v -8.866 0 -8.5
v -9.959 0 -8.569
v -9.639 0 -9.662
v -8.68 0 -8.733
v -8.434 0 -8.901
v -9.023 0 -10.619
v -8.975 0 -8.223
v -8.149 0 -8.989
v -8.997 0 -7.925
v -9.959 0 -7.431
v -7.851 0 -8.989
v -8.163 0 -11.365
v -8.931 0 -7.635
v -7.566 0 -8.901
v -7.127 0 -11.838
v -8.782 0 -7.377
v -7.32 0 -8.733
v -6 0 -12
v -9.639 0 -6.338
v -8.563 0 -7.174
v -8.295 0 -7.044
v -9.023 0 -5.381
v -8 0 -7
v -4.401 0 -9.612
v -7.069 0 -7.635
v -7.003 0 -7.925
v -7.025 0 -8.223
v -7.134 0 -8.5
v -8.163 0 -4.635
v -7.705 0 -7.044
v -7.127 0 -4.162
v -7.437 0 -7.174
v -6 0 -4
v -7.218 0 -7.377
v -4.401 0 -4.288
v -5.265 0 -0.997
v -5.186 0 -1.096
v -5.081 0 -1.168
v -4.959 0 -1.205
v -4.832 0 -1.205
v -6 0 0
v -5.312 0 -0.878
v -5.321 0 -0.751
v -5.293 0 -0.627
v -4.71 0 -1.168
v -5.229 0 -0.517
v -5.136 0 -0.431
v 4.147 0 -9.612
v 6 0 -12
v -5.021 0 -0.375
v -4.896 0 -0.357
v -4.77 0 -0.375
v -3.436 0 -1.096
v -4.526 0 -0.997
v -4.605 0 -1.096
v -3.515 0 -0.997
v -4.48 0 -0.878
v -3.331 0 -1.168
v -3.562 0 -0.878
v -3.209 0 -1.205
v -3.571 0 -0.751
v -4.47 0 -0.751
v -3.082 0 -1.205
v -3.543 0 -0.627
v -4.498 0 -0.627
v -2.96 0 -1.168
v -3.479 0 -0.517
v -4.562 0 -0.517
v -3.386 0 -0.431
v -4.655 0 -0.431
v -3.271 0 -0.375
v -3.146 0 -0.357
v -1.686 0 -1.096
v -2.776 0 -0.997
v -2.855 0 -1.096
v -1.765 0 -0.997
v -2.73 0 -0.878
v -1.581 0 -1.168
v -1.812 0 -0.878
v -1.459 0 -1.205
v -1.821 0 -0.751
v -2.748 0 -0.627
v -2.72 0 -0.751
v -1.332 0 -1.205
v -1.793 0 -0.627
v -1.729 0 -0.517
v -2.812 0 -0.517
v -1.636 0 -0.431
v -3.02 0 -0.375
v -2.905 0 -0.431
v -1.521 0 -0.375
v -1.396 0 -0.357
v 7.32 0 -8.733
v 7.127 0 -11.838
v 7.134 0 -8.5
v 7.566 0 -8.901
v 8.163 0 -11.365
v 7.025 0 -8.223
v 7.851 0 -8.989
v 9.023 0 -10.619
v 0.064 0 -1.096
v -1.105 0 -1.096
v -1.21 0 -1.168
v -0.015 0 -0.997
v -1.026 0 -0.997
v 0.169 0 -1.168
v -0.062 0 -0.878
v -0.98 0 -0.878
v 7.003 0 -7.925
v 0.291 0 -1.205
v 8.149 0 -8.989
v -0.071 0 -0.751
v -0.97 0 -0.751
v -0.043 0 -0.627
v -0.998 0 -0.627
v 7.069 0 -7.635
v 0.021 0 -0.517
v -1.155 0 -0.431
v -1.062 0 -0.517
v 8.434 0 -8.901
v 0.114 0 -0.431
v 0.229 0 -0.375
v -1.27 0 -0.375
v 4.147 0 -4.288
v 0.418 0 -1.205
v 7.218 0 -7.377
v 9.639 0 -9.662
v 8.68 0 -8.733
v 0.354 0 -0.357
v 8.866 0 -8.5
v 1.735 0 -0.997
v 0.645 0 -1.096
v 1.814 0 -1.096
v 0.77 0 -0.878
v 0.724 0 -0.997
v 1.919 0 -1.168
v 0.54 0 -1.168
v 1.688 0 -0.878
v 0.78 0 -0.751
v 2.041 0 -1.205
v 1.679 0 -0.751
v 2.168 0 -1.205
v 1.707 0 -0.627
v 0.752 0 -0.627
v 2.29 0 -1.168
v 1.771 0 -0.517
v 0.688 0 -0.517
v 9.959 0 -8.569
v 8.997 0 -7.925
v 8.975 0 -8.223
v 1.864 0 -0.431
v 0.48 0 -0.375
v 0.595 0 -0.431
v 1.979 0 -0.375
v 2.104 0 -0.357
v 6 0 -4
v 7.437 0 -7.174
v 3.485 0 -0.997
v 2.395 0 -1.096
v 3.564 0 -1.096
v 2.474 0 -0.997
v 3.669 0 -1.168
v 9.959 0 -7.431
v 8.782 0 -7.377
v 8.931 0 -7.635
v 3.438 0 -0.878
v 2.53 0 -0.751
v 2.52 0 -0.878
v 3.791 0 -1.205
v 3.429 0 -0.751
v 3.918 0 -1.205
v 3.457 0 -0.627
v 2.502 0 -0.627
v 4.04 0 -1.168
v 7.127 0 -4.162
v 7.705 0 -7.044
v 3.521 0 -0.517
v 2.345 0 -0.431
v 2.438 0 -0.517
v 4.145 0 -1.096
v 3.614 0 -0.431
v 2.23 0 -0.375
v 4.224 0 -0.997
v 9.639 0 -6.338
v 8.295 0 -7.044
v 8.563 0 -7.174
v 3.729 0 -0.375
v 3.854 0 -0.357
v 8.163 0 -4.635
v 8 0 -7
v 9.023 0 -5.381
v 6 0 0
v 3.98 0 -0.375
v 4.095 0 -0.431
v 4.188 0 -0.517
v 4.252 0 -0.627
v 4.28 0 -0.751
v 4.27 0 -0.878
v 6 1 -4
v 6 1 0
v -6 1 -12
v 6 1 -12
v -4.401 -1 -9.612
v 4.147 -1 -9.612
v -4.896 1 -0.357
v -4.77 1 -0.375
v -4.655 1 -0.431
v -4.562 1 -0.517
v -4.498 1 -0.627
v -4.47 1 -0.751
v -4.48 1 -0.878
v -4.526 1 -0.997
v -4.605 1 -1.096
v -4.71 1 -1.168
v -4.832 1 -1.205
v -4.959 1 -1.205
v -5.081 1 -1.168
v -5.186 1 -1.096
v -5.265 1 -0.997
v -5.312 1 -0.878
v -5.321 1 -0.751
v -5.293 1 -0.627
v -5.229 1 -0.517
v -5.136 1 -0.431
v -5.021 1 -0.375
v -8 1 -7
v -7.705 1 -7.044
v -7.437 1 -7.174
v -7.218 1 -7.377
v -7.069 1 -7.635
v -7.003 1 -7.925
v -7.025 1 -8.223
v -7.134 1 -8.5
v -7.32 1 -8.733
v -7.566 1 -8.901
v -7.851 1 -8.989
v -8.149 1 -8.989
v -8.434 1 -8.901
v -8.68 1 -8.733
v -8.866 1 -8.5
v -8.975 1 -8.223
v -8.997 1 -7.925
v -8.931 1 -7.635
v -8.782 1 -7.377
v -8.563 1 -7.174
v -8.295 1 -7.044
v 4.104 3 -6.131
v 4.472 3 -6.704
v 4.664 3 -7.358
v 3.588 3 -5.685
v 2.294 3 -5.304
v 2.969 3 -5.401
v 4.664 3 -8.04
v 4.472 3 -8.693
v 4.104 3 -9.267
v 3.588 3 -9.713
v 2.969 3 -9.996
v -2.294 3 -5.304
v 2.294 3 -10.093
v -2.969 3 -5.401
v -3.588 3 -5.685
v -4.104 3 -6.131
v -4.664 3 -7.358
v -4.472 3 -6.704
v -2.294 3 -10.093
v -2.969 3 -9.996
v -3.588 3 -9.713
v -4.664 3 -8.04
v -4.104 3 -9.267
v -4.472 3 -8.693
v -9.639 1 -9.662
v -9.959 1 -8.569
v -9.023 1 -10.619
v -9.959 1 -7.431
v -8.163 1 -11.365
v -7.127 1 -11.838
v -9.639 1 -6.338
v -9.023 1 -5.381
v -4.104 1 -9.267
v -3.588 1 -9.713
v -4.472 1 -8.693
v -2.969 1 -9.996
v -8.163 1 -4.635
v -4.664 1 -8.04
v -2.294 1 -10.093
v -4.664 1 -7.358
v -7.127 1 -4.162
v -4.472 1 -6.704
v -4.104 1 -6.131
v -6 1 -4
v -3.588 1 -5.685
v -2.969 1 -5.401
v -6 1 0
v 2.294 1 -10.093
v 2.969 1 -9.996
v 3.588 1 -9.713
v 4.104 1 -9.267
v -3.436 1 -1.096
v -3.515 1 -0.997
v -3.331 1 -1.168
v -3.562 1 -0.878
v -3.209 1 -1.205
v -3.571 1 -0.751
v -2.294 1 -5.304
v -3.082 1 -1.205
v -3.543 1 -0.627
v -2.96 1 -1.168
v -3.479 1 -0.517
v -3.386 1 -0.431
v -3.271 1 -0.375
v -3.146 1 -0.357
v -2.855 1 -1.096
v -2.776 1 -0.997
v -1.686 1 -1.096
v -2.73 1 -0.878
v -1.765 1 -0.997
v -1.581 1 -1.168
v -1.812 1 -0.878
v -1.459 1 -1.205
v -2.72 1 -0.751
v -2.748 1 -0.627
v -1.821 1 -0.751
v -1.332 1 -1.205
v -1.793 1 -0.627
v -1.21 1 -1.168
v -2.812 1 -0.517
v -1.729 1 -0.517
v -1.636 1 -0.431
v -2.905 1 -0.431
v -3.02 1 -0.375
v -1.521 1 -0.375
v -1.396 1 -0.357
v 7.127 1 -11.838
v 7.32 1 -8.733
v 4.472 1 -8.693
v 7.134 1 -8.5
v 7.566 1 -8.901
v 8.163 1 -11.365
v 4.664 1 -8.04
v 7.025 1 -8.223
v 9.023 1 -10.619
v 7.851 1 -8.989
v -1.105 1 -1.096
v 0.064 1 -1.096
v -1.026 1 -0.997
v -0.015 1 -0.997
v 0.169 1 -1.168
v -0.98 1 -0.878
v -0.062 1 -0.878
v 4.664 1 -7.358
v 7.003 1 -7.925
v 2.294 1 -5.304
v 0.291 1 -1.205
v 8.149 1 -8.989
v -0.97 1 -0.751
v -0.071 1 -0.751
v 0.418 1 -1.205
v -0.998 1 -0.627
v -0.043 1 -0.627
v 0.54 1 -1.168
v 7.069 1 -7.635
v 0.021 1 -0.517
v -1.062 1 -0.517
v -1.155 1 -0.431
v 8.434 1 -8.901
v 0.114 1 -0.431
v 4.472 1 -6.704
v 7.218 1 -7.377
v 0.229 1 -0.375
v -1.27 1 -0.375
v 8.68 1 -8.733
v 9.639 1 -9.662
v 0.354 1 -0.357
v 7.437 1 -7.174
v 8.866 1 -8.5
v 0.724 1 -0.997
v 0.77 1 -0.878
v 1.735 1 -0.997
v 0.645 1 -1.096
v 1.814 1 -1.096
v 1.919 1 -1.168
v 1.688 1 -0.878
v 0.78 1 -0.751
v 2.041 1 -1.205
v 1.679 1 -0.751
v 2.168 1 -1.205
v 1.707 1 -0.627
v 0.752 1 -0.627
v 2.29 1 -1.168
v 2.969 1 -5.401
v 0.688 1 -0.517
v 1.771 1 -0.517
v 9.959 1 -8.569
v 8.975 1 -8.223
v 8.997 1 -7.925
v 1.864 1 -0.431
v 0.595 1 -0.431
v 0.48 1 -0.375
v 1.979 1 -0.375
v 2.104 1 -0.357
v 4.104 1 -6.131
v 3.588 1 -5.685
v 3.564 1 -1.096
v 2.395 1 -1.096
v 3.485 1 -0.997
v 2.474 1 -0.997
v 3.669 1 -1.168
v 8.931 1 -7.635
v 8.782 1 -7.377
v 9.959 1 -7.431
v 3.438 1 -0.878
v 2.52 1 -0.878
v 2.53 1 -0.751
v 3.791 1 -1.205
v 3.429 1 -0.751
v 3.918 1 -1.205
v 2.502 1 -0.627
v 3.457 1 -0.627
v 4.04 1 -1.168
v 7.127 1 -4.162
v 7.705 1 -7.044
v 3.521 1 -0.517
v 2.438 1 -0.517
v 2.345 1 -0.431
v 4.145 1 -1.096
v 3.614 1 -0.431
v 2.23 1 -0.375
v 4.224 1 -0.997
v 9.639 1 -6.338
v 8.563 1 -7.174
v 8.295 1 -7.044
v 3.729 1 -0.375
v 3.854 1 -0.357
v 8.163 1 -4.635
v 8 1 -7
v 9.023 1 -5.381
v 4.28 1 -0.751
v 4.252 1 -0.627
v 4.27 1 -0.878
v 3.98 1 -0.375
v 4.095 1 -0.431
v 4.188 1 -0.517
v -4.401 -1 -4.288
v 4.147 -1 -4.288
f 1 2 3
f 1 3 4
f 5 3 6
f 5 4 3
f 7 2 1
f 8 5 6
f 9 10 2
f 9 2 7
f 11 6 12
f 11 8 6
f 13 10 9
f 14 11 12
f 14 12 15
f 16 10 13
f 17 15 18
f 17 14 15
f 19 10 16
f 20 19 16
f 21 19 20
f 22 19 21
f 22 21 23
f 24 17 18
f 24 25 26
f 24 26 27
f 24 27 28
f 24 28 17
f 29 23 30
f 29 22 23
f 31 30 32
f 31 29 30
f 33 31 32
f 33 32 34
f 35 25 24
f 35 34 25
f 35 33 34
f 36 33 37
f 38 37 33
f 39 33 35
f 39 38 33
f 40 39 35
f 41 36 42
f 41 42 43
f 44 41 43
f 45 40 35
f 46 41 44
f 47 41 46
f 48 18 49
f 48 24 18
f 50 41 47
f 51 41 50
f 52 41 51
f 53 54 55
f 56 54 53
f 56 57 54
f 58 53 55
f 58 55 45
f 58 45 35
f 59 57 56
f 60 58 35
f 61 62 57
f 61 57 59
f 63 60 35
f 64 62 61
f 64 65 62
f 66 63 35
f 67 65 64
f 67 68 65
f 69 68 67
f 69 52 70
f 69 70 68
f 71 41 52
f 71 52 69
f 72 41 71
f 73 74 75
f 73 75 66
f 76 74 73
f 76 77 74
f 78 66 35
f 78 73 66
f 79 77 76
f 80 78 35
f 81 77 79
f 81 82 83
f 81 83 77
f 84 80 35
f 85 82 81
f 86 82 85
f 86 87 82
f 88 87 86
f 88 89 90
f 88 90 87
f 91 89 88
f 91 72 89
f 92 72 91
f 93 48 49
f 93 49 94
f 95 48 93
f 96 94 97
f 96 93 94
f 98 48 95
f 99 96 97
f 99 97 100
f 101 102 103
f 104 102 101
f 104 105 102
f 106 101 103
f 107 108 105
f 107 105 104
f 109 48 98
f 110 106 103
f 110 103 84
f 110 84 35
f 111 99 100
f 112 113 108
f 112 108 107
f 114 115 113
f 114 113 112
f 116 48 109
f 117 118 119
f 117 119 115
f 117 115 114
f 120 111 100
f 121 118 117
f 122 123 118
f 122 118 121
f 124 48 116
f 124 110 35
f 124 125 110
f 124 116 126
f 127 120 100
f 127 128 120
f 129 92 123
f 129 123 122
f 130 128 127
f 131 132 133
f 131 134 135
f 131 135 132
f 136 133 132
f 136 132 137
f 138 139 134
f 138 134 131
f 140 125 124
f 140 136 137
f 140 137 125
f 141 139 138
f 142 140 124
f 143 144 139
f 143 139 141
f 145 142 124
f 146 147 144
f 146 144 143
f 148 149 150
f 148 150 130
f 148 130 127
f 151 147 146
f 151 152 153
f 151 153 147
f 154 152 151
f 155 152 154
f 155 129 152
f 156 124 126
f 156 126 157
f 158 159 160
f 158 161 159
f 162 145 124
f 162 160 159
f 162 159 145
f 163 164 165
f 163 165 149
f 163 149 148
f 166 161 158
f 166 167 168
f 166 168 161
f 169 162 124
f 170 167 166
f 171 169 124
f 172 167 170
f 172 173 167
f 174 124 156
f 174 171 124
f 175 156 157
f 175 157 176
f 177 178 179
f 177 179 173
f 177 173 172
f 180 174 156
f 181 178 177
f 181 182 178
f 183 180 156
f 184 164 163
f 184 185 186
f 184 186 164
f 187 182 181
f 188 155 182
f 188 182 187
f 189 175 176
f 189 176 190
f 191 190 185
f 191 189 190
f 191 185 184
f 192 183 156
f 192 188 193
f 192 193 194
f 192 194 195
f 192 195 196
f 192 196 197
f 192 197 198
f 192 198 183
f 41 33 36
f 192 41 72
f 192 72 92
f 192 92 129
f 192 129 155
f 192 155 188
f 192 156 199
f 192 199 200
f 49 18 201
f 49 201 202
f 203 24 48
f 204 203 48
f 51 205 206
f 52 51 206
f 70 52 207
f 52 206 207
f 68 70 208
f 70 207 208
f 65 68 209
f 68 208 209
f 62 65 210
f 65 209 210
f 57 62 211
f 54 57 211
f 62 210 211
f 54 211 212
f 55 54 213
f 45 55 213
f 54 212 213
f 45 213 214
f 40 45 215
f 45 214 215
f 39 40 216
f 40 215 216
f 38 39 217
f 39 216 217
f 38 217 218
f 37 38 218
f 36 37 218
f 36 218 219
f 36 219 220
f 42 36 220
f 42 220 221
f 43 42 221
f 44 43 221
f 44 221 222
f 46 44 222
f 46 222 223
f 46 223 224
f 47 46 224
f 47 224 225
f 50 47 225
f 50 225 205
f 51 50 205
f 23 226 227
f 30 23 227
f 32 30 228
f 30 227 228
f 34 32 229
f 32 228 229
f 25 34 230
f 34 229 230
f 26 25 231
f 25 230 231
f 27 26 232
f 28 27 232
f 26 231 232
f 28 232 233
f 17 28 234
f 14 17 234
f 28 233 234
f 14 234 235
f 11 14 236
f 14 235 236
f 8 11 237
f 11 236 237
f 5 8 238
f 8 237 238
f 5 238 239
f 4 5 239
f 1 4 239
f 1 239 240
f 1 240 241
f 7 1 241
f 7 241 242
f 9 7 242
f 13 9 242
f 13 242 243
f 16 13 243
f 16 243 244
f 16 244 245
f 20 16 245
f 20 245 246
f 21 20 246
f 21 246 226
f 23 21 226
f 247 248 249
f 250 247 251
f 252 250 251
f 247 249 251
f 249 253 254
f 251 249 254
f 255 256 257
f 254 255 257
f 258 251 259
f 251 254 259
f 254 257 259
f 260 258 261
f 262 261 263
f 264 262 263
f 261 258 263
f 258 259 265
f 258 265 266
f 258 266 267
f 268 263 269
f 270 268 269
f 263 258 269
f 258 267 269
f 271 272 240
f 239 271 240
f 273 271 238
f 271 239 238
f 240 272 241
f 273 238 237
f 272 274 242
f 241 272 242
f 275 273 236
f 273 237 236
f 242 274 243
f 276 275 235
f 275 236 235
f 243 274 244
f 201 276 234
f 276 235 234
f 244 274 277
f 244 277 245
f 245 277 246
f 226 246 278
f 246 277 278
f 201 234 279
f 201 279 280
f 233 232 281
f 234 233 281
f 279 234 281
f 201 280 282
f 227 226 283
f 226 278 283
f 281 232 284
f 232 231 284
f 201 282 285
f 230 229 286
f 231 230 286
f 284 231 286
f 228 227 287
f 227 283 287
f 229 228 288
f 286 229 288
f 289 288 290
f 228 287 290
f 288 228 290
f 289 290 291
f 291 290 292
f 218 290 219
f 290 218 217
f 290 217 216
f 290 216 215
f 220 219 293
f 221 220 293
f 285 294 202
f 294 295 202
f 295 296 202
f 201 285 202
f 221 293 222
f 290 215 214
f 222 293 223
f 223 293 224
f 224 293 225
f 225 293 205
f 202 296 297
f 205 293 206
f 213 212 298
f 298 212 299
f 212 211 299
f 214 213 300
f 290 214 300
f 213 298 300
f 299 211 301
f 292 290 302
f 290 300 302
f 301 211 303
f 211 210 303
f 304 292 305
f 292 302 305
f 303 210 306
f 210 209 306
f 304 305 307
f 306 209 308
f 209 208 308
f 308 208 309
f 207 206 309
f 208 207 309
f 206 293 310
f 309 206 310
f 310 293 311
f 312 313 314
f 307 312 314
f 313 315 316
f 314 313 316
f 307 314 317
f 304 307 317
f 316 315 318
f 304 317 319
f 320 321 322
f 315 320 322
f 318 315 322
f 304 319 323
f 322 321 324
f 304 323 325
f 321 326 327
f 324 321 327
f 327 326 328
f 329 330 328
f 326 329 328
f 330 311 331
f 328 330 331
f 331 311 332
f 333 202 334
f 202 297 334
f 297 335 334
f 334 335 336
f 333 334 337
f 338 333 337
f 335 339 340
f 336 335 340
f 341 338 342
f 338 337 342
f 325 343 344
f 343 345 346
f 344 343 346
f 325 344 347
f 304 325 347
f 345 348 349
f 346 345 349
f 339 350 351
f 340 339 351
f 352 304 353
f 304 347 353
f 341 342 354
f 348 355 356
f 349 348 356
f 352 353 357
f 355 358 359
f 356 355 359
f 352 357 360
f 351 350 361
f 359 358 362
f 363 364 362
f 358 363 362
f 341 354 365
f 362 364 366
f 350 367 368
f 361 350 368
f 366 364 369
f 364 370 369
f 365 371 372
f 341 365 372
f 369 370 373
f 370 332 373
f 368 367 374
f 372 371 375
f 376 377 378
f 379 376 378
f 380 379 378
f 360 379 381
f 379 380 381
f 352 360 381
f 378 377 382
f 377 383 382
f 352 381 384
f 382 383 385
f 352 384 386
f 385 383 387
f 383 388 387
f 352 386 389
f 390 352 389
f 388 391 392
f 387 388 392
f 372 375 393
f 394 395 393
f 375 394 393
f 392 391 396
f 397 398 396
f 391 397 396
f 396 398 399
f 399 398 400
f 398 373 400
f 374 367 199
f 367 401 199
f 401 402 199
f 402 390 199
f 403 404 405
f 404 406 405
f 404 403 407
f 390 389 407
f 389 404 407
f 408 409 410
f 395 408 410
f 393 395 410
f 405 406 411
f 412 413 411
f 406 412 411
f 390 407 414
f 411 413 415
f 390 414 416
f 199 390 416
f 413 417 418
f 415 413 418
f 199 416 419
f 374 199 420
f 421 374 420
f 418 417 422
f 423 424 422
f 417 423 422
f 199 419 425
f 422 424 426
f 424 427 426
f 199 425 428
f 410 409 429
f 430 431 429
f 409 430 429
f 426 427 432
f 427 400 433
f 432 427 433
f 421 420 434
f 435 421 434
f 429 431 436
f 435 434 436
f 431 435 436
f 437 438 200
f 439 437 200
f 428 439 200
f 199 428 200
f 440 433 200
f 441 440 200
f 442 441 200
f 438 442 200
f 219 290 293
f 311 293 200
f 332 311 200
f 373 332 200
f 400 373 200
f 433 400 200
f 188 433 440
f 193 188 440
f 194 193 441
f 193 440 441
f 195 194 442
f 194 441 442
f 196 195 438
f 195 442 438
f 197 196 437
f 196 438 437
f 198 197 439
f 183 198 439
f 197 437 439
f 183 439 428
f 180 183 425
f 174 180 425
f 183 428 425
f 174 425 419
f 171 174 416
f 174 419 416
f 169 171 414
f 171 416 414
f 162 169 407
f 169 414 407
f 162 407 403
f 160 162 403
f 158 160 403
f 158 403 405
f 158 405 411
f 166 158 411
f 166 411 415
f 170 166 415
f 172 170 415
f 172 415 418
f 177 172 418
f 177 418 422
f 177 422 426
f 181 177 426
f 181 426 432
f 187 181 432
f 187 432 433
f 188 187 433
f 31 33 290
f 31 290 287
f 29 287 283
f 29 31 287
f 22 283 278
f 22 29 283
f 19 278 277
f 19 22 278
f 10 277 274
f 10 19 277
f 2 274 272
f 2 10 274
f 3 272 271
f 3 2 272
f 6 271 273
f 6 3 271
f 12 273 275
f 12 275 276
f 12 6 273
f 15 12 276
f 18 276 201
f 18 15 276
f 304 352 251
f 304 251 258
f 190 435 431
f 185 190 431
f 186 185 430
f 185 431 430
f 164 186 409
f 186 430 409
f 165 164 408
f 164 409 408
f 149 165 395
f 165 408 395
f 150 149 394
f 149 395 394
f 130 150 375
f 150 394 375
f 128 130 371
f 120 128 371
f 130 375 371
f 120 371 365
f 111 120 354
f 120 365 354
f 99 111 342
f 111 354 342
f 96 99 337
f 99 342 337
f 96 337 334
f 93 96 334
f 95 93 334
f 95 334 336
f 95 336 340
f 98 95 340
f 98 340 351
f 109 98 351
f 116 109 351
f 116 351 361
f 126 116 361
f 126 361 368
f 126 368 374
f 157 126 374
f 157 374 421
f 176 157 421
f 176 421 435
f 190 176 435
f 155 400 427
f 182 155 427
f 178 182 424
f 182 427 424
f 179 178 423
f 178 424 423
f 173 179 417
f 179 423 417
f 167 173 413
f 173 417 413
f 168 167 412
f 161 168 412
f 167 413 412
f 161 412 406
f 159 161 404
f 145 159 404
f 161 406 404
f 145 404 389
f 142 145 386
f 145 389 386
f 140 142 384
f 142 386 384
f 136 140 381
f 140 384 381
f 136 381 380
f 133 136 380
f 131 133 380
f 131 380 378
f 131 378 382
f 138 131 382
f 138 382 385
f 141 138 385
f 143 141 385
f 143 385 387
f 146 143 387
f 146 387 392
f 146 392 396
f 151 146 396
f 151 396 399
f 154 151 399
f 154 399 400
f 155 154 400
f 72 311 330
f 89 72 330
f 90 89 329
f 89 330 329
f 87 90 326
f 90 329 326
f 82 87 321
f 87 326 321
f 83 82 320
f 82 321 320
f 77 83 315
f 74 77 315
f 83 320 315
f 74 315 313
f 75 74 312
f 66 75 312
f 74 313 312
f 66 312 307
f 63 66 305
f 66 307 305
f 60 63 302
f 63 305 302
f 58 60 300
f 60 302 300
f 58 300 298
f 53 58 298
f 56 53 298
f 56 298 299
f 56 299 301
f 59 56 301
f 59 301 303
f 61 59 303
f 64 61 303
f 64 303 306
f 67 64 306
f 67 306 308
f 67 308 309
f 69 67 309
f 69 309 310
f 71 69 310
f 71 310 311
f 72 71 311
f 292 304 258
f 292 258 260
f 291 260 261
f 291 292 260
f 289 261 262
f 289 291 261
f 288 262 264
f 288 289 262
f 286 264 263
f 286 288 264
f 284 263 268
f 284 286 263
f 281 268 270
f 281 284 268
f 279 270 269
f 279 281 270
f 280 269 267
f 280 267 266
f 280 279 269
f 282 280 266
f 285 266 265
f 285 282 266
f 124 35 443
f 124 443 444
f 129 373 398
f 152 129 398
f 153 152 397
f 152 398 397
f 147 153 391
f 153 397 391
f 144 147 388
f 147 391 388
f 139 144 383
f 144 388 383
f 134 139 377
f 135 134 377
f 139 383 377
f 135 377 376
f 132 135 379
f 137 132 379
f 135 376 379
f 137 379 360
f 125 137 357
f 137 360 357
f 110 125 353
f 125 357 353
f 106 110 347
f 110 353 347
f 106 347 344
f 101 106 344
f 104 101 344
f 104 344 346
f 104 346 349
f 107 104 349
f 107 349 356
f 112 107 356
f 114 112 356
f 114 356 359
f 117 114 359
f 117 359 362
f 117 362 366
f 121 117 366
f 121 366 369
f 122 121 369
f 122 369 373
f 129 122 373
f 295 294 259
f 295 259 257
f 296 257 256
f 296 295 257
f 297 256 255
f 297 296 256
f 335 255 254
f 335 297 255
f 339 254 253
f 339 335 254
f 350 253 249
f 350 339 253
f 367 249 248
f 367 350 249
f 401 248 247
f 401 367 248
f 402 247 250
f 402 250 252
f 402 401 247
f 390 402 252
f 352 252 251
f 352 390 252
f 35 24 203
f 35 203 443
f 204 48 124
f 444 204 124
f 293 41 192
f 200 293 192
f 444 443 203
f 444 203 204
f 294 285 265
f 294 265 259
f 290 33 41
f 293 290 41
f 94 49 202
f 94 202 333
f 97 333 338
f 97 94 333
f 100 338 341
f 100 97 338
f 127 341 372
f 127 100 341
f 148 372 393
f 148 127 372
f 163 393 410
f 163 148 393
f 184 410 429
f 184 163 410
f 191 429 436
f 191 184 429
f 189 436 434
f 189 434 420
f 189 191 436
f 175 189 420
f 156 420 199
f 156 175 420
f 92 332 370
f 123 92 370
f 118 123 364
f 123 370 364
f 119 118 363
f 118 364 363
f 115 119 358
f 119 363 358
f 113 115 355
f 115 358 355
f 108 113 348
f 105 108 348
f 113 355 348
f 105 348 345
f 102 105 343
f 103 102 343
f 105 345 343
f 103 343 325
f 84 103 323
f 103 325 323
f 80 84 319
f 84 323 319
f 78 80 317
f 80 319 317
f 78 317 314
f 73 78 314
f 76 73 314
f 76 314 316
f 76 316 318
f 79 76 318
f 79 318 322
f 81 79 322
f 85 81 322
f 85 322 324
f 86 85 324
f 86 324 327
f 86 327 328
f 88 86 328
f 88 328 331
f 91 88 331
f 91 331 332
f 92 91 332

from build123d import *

# Parameters (mm, degrees)
BOSS_EXTRUDE1_DEPTH = 1
SKETCH2_W           = 12
SKETCH2_H           = 4
BOSS_EXTRUDE2_DEPTH = 1
SKETCH3_R           = 1
SKETCH3_R_2         = 0.426779722
CUT_EXTRUDE1_DEPTH  = 16.652475842
BOSS_EXTRUDE3_DEPTH = 2
SKETCH5_W           = 8.547335384
SKETCH5_H           = 5.323692461
BOSS_EXTRUDE4_DEPTH = 1


with BuildPart() as part:
    # Sketch1 → Boss-Extrude1 (new body)
    with BuildSketch(Plane(origin=(0, 0, 0), x_dir=(1, 0, 0), z_dir=(0, 1, 0))):
        with BuildLine():
            Line((-6, 12), (6, 12))
            ThreePointArc((6, 12), (10, 8), (6, 4))
            Line((6, 4), (-6, 4))
            ThreePointArc((-6, 4), (-10, 8), (-6, 12))
        make_face()
    extrude(amount=BOSS_EXTRUDE1_DEPTH)

    # Sketch2 → Boss-Extrude2 (add)
    with BuildSketch(Plane.XZ):
        with Locations((0, -2)):
            Rectangle(SKETCH2_W, SKETCH2_H)
    extrude(amount=-BOSS_EXTRUDE2_DEPTH)

    # Sketch3 → Cut-Extrude1 (cut, through all)
    with BuildSketch(Plane(origin=(0, 1, 0), x_dir=(1, 0, 0), z_dir=(0, 1, 0))):
        with Locations(Location((8, 8, 0), (0, 0, 270))):
            Circle(SKETCH3_R)
        with Locations(Location((-8, 8, 0), (0, 0, 270))):
            Circle(SKETCH3_R)
        with Locations(Location((-4.895656887, 0.783316432, 0), (0, 0, 270))):
            Circle(SKETCH3_R_2)
        with Locations(Location((-3.145656887, 0.783316432, 0), (0, 0, 270))):
            Circle(SKETCH3_R_2)
        with Locations(Location((-1.395656887, 0.783316432, 0), (0, 0, 270))):
            Circle(SKETCH3_R_2)
        with Locations(Location((0.354343113, 0.783316432, 0), (0, 0, 270))):
            Circle(SKETCH3_R_2)
        with Locations(Location((2.104343113, 0.783316432, 0), (0, 0, 270))):
            Circle(SKETCH3_R_2)
        with Locations(Location((3.854343113, 0.783316432, 0), (0, 0, 270))):
            Circle(SKETCH3_R_2)
    extrude(amount=-CUT_EXTRUDE1_DEPTH, mode=Mode.SUBTRACT)

    # Sketch4 → Boss-Extrude3 (add)
    with BuildSketch(Plane(origin=(0, 1, 0), x_dir=(1, 0, 0), z_dir=(0, 1, 0))):
        with BuildLine():
            Line((-2.294003159, 10.093090184), (2.294003159, 10.093090184))
            ThreePointArc((2.294003159, 10.093090184), (4.688327155, 7.698766187), (2.294003159, 5.304442191))
            Line((2.294003159, 5.304442191), (-2.294003159, 5.304442191))
            ThreePointArc((-2.294003159, 5.304442191), (-4.688327155, 7.698766187), (-2.294003159, 10.093090184))
        make_face()
    extrude(amount=BOSS_EXTRUDE3_DEPTH)

    # Sketch5 → Boss-Extrude4 (add)
    with BuildSketch(Plane.XZ):
        with Locations((-0.127073061, -6.949703932)):
            Rectangle(SKETCH5_W, SKETCH5_H)
    extrude(amount=BOSS_EXTRUDE4_DEPTH)


solid = part.part
